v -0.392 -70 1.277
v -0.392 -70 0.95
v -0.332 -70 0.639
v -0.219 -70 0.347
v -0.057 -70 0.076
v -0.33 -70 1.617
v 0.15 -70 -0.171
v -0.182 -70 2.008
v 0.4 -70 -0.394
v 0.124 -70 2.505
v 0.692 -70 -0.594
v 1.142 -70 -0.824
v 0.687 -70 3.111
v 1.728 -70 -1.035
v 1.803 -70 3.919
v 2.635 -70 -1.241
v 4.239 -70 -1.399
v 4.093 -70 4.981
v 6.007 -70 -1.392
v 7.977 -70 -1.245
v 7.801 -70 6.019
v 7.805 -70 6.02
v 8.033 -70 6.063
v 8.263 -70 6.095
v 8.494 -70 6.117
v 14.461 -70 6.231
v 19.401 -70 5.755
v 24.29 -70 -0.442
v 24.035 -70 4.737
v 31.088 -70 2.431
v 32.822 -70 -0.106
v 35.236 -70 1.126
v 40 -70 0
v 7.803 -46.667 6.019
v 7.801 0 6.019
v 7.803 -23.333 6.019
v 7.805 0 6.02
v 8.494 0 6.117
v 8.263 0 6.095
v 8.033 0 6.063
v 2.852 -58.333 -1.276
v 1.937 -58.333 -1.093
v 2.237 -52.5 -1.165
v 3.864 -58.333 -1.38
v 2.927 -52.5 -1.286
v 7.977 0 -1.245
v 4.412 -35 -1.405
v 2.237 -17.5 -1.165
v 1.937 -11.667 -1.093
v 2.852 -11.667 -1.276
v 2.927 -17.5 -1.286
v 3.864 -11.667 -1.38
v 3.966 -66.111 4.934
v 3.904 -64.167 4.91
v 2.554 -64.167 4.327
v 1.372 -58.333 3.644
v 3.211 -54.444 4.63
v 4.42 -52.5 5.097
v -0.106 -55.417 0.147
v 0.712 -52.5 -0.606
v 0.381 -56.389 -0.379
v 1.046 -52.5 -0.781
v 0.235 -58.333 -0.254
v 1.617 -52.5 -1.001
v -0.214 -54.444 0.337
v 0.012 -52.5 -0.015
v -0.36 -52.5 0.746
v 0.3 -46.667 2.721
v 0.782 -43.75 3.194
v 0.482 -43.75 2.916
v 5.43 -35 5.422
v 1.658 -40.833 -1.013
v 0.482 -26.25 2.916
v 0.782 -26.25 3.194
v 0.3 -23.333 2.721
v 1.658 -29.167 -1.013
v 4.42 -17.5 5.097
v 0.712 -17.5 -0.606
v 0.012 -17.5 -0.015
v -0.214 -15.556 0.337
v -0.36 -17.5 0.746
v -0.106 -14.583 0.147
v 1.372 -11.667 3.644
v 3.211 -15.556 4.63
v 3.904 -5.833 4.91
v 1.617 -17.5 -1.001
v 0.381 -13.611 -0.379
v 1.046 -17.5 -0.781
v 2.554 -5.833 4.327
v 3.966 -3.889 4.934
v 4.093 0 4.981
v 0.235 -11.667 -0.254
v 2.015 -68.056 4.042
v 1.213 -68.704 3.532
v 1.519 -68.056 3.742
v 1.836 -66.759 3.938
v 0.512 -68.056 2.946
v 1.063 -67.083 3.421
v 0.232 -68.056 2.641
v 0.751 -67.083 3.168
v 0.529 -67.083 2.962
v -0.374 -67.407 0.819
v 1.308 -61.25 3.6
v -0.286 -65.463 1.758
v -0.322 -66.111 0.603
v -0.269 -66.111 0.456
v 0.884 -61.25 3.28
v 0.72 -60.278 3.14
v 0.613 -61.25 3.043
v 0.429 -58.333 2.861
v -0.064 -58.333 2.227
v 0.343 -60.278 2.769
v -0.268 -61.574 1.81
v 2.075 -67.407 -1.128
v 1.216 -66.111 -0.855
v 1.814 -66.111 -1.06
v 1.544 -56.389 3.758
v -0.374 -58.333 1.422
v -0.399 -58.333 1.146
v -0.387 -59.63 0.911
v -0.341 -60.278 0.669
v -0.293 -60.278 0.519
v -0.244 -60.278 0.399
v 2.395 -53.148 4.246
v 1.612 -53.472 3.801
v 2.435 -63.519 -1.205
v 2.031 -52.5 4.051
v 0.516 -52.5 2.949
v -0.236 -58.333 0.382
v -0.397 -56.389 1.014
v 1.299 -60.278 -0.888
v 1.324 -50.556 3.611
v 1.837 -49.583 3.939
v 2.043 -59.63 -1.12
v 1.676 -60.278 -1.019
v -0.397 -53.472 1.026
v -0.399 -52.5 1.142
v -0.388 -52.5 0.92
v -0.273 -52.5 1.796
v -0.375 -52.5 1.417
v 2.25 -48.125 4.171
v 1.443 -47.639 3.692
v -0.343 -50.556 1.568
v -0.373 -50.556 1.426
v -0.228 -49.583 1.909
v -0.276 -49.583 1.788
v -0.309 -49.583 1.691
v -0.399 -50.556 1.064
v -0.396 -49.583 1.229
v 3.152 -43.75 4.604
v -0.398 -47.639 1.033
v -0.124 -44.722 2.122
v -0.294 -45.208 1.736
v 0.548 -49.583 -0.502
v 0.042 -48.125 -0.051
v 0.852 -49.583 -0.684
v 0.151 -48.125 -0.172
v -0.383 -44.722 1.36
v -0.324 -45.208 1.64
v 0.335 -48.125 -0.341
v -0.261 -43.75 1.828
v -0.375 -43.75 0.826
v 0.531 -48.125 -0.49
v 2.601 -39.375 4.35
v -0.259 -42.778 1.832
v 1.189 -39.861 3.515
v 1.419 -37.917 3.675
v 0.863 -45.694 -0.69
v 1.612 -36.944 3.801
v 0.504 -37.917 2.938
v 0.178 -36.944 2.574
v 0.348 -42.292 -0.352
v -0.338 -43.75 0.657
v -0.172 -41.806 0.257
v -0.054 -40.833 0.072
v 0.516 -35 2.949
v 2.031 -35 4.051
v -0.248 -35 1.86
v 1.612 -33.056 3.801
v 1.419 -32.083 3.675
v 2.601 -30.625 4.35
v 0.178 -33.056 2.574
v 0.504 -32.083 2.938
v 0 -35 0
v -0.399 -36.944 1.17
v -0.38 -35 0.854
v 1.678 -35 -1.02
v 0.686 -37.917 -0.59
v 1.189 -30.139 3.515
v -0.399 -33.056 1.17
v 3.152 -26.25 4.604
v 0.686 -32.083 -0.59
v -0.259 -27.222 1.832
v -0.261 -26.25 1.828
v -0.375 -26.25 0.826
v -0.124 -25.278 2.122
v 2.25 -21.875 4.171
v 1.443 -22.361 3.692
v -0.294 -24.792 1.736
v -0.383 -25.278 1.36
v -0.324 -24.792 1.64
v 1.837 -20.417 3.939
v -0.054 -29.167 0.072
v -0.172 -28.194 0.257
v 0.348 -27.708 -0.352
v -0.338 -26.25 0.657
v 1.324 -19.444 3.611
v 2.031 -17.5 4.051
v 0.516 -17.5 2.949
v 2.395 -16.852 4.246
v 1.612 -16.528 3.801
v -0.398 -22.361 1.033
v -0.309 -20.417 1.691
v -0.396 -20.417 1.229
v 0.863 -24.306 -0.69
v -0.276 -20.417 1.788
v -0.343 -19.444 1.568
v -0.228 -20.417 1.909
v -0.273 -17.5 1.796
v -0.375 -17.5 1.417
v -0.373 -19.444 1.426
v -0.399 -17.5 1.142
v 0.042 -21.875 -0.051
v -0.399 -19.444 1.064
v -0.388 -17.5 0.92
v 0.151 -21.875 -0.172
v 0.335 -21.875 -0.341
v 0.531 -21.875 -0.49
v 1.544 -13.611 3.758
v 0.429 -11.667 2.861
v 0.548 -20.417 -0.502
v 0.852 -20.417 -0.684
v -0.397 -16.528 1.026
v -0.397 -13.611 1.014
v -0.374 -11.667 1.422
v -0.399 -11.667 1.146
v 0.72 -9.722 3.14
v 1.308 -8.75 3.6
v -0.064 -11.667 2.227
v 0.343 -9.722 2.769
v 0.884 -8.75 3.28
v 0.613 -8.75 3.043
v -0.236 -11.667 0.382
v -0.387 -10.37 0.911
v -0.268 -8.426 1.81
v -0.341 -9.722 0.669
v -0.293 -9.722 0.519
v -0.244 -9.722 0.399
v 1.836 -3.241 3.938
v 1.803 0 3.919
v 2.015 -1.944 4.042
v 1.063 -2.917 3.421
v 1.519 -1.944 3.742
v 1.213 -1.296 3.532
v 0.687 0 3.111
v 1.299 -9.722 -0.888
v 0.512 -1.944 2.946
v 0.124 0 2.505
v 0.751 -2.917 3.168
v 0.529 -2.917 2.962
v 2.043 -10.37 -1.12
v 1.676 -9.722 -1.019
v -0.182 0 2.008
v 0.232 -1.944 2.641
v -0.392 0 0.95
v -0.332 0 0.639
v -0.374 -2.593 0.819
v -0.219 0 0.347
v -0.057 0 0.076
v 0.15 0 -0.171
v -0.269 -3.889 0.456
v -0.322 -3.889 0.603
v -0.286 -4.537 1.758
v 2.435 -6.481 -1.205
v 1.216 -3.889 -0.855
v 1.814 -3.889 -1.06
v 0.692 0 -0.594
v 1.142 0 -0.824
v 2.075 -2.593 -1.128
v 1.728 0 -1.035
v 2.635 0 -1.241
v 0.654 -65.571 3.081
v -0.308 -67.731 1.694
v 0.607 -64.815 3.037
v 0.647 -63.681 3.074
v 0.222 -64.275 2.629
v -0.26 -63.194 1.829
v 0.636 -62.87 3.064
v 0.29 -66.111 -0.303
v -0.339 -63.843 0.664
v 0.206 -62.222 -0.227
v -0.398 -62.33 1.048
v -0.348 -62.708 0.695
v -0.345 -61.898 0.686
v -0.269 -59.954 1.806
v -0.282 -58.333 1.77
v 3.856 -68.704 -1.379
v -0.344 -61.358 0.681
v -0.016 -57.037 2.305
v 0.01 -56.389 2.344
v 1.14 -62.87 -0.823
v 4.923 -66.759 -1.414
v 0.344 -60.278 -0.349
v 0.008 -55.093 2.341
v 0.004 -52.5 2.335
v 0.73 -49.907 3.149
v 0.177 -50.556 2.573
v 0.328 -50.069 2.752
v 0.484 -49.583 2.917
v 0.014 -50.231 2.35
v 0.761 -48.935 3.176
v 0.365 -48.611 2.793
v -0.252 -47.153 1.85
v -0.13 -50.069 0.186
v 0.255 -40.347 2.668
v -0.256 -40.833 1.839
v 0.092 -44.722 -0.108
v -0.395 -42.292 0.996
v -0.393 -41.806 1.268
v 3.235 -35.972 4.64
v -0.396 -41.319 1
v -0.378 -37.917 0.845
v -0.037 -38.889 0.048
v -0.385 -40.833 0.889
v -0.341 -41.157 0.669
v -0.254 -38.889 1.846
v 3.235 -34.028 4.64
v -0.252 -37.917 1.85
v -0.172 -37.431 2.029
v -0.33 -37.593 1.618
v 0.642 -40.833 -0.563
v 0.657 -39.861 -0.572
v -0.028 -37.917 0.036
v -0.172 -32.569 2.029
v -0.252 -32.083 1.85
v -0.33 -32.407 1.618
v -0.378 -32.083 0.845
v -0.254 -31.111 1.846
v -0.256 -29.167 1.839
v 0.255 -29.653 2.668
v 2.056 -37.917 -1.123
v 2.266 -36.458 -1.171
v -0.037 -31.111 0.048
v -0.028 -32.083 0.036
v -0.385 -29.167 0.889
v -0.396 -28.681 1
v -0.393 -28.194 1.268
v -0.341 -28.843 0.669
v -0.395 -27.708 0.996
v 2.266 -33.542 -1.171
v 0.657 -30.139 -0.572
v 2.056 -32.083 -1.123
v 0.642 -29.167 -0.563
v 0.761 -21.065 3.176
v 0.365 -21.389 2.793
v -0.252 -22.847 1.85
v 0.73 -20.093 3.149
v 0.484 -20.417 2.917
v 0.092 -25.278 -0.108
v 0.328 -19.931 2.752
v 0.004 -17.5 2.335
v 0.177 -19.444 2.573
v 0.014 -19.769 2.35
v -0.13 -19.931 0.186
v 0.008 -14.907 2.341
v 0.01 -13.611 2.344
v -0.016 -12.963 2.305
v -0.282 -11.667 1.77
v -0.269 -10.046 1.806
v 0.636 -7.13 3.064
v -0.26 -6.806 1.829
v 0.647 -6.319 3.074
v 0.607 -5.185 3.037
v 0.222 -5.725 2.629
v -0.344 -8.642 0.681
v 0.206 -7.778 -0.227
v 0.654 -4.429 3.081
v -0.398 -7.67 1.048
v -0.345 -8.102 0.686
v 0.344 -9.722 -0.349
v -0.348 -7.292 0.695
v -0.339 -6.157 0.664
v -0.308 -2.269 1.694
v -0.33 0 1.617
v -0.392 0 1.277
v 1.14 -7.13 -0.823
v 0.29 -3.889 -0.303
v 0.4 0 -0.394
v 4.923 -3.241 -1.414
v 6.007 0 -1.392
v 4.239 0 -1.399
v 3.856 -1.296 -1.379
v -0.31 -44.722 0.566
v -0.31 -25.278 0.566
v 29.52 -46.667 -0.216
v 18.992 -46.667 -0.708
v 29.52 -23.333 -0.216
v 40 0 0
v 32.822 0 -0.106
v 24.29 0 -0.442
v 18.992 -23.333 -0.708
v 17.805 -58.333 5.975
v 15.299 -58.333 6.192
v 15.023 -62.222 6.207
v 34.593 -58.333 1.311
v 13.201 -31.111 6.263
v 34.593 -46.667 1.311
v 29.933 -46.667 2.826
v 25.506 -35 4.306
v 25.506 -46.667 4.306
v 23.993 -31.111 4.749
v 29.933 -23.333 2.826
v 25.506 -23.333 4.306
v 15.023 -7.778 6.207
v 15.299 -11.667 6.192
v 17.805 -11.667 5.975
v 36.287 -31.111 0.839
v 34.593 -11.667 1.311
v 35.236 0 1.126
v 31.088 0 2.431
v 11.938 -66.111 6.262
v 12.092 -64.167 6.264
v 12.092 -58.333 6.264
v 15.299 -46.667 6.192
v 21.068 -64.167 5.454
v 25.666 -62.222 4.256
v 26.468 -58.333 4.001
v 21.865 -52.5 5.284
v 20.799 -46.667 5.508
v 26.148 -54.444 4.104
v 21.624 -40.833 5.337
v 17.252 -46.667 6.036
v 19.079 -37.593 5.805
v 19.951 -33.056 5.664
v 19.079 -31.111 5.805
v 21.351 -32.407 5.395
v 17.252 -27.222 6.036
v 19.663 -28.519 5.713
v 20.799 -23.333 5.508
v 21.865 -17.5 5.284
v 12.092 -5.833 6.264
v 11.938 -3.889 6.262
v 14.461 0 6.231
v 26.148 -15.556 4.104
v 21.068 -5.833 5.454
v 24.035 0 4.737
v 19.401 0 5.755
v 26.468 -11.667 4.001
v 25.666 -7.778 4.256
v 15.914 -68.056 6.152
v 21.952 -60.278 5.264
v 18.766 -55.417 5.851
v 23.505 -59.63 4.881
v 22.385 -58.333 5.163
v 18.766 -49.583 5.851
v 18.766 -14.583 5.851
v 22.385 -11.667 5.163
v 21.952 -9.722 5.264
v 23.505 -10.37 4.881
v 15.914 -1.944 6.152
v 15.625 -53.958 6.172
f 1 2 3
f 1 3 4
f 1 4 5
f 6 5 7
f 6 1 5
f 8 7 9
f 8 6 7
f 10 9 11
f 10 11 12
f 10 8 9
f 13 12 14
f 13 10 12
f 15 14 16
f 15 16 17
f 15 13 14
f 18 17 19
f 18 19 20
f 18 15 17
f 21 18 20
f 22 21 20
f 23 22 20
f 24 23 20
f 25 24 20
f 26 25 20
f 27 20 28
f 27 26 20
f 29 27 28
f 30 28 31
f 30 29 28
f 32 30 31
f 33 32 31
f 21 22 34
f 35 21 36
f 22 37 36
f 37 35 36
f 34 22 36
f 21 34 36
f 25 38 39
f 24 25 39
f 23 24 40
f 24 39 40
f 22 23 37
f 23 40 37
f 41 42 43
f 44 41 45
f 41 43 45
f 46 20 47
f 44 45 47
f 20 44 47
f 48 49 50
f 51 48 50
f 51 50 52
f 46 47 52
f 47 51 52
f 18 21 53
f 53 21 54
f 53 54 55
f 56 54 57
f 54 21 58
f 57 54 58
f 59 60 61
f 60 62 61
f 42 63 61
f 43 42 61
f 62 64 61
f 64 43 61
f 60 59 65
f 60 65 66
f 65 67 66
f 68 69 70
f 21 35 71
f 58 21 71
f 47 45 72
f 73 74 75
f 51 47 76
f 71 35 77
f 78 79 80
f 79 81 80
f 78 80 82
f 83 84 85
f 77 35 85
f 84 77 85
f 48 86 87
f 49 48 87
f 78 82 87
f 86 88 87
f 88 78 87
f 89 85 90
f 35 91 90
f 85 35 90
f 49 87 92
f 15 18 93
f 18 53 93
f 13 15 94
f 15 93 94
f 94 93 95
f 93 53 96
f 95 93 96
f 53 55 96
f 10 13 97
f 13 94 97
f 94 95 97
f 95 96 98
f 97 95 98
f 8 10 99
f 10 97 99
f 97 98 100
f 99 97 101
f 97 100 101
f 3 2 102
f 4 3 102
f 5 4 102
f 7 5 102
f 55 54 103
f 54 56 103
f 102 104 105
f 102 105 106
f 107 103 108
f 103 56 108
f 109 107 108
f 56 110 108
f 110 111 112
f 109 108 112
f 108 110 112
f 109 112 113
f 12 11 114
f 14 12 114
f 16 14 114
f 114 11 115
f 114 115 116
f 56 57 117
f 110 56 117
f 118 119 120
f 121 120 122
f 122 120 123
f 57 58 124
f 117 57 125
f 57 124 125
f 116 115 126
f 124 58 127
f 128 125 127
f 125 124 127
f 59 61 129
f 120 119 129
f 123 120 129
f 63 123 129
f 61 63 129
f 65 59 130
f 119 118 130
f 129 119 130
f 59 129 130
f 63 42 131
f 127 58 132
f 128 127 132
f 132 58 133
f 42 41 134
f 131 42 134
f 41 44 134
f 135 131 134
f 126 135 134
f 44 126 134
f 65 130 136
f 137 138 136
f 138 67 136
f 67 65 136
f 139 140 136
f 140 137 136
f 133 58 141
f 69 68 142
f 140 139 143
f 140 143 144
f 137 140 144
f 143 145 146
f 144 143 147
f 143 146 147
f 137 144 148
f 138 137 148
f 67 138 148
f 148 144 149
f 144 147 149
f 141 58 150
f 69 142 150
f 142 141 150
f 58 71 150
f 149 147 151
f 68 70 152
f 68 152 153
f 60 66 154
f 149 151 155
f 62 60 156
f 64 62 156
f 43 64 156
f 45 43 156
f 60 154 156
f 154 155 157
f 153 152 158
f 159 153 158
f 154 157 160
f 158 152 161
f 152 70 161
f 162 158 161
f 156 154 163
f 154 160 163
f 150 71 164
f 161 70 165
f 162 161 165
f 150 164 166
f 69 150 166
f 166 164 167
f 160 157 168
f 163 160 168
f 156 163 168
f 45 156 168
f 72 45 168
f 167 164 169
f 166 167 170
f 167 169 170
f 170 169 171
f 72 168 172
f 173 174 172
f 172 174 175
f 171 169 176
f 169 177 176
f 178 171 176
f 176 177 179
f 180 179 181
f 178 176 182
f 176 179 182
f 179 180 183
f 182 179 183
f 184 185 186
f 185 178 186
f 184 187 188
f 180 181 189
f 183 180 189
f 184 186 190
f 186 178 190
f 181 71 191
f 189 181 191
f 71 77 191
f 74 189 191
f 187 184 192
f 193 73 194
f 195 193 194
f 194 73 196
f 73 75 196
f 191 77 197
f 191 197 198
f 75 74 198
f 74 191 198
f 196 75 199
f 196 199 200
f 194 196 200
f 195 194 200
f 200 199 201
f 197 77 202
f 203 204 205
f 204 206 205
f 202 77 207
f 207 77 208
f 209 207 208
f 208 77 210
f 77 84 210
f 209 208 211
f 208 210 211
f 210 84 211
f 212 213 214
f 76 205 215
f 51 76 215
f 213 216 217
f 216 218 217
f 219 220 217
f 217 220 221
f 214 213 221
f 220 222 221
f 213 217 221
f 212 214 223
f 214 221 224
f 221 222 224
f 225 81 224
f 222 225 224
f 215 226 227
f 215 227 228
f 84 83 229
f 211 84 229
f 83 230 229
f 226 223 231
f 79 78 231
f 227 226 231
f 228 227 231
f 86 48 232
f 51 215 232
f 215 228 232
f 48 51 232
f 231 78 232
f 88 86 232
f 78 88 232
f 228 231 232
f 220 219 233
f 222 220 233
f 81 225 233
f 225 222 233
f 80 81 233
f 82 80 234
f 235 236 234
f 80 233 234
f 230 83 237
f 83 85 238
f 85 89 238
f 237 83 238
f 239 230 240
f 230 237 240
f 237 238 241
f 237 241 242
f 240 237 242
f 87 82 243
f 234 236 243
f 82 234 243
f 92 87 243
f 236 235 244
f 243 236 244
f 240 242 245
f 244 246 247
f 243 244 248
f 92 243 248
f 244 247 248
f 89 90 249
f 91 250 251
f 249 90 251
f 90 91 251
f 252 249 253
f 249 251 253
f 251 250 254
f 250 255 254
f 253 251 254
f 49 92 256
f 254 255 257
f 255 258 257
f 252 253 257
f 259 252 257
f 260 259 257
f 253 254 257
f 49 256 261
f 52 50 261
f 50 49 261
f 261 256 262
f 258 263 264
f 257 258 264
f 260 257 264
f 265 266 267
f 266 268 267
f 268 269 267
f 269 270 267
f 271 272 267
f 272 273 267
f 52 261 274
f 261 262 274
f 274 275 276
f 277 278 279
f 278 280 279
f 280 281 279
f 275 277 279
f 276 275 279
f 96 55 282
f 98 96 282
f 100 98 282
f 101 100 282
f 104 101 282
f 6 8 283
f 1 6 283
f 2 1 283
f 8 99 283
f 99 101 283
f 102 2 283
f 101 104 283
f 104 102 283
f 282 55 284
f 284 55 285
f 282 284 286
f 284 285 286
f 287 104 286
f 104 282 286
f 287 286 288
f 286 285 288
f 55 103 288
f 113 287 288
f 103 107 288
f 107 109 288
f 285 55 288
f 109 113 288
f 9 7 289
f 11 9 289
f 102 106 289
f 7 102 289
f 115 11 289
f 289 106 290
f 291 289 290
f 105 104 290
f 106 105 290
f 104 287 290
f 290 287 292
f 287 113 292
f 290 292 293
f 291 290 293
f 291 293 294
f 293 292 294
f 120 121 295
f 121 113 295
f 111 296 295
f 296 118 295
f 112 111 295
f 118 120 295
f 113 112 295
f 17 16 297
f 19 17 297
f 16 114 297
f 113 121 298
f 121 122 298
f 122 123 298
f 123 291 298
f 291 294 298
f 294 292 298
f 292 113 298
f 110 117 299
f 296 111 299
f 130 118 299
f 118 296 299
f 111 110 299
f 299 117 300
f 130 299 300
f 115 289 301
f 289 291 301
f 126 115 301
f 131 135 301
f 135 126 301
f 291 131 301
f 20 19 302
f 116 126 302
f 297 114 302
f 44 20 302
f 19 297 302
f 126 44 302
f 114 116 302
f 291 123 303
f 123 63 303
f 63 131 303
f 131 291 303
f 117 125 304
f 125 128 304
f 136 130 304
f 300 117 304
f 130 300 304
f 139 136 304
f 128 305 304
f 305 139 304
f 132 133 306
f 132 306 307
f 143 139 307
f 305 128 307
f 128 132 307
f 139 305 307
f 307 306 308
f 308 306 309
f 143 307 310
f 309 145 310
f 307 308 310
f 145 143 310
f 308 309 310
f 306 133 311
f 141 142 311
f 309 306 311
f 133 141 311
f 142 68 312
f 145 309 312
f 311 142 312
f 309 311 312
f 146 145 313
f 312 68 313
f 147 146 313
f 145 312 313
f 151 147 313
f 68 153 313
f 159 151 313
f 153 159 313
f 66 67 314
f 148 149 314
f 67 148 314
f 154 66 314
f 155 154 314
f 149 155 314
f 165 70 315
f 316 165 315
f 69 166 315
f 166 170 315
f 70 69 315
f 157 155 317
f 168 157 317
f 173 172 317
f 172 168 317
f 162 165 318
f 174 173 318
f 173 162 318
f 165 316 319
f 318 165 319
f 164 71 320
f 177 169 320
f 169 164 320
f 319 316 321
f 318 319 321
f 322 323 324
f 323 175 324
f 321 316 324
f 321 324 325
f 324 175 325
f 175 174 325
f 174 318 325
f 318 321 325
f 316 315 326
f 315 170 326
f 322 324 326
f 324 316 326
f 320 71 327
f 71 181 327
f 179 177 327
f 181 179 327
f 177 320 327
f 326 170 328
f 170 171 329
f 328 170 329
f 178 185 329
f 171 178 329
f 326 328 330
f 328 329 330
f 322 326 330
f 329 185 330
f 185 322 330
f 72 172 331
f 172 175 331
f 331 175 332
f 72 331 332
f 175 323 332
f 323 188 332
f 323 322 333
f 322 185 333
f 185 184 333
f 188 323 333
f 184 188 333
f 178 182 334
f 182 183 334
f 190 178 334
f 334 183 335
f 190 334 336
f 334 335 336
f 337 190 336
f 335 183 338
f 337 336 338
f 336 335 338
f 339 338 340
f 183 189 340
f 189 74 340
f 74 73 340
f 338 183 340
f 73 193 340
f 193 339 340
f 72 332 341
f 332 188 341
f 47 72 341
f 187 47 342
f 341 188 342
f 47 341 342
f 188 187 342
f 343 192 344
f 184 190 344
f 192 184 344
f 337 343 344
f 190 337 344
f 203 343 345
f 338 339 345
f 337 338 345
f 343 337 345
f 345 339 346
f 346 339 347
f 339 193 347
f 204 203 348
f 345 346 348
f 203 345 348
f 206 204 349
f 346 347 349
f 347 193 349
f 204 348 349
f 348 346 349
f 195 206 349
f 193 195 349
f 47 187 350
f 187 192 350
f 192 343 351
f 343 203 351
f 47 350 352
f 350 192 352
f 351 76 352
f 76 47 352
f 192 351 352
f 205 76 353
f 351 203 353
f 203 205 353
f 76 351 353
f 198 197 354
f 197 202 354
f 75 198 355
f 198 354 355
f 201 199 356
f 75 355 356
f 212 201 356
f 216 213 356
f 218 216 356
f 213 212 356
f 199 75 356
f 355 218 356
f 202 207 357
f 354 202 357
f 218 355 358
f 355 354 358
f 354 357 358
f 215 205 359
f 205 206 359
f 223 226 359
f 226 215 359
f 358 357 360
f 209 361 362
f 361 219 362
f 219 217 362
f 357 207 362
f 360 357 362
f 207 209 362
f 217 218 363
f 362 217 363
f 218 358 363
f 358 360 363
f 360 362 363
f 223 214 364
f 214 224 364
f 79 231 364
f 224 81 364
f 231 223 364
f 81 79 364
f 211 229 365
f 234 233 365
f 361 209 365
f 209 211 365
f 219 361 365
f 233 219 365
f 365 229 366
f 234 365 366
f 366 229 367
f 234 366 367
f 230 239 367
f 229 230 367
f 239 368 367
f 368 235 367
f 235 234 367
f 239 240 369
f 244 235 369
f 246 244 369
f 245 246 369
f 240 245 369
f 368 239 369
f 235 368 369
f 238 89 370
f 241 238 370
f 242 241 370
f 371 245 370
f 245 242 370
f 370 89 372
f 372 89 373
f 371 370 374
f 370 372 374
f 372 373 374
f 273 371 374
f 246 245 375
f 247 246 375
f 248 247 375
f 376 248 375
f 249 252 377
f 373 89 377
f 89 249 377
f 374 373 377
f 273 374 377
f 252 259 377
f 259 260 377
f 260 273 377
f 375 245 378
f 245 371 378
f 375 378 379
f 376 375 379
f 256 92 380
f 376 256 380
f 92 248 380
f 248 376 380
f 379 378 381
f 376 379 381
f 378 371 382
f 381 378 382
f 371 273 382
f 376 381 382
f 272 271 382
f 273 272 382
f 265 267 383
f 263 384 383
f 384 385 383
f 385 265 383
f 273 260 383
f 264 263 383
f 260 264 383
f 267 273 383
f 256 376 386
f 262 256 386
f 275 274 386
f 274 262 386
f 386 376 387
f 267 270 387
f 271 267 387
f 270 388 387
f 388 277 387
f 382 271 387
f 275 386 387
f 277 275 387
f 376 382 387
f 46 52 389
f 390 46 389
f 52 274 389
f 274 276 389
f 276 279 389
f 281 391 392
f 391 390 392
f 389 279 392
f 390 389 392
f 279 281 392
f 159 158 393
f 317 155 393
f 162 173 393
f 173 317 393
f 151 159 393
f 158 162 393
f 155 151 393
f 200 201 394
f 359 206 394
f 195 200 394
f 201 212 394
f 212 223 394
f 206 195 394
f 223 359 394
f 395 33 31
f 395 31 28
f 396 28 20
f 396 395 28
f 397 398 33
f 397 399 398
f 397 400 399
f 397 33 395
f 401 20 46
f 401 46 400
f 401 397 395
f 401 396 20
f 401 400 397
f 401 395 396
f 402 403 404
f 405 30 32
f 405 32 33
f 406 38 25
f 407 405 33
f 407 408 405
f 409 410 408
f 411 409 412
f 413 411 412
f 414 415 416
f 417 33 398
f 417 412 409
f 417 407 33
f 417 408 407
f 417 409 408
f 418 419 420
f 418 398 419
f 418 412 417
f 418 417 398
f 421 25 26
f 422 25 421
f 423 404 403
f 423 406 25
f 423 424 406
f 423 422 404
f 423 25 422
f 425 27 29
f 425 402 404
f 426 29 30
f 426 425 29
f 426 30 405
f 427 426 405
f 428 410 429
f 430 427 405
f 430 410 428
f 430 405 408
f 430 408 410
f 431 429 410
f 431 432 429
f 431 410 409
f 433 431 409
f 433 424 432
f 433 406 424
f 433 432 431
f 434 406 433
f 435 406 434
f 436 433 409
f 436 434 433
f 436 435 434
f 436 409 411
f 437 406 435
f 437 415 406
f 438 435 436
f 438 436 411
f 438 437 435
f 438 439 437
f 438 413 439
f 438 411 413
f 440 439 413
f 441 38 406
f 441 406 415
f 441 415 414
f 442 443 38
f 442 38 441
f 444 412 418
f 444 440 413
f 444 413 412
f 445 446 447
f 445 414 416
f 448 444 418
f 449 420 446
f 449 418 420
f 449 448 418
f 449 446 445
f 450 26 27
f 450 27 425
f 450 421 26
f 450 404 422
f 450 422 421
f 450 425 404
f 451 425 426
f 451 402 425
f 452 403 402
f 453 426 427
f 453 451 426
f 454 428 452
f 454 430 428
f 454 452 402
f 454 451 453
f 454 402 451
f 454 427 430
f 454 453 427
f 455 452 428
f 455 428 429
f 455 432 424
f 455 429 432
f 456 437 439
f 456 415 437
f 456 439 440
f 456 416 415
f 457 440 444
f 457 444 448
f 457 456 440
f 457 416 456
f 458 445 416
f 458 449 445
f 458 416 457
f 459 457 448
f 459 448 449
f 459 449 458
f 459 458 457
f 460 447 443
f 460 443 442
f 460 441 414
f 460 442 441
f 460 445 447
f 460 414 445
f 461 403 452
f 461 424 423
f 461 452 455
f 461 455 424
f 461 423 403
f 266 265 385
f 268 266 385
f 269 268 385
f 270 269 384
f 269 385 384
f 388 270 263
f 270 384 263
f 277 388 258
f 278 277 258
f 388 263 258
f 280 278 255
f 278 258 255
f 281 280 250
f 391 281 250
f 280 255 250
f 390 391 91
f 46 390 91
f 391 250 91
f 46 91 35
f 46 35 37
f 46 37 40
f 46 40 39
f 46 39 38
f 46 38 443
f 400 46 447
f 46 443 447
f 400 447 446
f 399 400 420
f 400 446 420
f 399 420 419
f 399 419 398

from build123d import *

# Parameters (mm, degrees)
F1_DEPTH = 70


# Not quite as in the source:
# - ends of sketch curves that miss each other by under 0.0002 mm in the source are joined


with BuildPart() as f1:
    # F0 (on Front) → F1 (new body)
    with BuildSketch(Plane.XZ):
        with BuildLine():
            ThreePointArc((8.4943538532, 6.1165723018), (8.1478009221, 6.0800981354), (7.80463009, 6.0195747612))
            add(Edge.make_bspline(
                [(7.80463009, 6.0195747612), (7.8033284675, 6.0192985857), (7.8020273177, 6.0190210249), (7.800726352, 6.018743432)],
                knots=[0.007555438, 0.007555438, 0.007555438, 0.007555438, 0.0076419863, 0.0076419863, 0.0076419863, 0.0076419863], degree=3))
            add(Edge.make_bspline(
                [(7.800726352, 6.018743432), (-0.0344115563, 4.3469248193), (-2.2359286822, -1.0520505926), (4.0699255085, -1.6493105494), (7.9768506791, -1.2445967448)],
                knots=[0.0076419863, 0.0076419863, 0.0076419863, 0.0076419863, 0.5288840216, 1, 1, 1, 1], degree=3))
            add(Edge.make_bspline(
                [(40, 0), (29.3975914618, 0), (19.3824759115, -0.7626691443), (7.9768506791, -1.2445967448)],
                knots=[0, 0, 0, 0, 32.0473261519, 32.0473261519, 32.0473261519, 32.0473261519], degree=3))
            add(Edge.make_bspline(
                [(8.4943538532, 6.1165723018), (23.7515253745, 7.1864547693), (28.0988142674, 2.2560978858), (40, 0)],
                knots=[0.2410904053, 0.2410904053, 0.2410904053, 0.2410904053, 32.4276209152, 32.4276209152, 32.4276209152, 32.4276209152], degree=3))
        make_face()
    extrude(amount=F1_DEPTH)


solid = f1.part
